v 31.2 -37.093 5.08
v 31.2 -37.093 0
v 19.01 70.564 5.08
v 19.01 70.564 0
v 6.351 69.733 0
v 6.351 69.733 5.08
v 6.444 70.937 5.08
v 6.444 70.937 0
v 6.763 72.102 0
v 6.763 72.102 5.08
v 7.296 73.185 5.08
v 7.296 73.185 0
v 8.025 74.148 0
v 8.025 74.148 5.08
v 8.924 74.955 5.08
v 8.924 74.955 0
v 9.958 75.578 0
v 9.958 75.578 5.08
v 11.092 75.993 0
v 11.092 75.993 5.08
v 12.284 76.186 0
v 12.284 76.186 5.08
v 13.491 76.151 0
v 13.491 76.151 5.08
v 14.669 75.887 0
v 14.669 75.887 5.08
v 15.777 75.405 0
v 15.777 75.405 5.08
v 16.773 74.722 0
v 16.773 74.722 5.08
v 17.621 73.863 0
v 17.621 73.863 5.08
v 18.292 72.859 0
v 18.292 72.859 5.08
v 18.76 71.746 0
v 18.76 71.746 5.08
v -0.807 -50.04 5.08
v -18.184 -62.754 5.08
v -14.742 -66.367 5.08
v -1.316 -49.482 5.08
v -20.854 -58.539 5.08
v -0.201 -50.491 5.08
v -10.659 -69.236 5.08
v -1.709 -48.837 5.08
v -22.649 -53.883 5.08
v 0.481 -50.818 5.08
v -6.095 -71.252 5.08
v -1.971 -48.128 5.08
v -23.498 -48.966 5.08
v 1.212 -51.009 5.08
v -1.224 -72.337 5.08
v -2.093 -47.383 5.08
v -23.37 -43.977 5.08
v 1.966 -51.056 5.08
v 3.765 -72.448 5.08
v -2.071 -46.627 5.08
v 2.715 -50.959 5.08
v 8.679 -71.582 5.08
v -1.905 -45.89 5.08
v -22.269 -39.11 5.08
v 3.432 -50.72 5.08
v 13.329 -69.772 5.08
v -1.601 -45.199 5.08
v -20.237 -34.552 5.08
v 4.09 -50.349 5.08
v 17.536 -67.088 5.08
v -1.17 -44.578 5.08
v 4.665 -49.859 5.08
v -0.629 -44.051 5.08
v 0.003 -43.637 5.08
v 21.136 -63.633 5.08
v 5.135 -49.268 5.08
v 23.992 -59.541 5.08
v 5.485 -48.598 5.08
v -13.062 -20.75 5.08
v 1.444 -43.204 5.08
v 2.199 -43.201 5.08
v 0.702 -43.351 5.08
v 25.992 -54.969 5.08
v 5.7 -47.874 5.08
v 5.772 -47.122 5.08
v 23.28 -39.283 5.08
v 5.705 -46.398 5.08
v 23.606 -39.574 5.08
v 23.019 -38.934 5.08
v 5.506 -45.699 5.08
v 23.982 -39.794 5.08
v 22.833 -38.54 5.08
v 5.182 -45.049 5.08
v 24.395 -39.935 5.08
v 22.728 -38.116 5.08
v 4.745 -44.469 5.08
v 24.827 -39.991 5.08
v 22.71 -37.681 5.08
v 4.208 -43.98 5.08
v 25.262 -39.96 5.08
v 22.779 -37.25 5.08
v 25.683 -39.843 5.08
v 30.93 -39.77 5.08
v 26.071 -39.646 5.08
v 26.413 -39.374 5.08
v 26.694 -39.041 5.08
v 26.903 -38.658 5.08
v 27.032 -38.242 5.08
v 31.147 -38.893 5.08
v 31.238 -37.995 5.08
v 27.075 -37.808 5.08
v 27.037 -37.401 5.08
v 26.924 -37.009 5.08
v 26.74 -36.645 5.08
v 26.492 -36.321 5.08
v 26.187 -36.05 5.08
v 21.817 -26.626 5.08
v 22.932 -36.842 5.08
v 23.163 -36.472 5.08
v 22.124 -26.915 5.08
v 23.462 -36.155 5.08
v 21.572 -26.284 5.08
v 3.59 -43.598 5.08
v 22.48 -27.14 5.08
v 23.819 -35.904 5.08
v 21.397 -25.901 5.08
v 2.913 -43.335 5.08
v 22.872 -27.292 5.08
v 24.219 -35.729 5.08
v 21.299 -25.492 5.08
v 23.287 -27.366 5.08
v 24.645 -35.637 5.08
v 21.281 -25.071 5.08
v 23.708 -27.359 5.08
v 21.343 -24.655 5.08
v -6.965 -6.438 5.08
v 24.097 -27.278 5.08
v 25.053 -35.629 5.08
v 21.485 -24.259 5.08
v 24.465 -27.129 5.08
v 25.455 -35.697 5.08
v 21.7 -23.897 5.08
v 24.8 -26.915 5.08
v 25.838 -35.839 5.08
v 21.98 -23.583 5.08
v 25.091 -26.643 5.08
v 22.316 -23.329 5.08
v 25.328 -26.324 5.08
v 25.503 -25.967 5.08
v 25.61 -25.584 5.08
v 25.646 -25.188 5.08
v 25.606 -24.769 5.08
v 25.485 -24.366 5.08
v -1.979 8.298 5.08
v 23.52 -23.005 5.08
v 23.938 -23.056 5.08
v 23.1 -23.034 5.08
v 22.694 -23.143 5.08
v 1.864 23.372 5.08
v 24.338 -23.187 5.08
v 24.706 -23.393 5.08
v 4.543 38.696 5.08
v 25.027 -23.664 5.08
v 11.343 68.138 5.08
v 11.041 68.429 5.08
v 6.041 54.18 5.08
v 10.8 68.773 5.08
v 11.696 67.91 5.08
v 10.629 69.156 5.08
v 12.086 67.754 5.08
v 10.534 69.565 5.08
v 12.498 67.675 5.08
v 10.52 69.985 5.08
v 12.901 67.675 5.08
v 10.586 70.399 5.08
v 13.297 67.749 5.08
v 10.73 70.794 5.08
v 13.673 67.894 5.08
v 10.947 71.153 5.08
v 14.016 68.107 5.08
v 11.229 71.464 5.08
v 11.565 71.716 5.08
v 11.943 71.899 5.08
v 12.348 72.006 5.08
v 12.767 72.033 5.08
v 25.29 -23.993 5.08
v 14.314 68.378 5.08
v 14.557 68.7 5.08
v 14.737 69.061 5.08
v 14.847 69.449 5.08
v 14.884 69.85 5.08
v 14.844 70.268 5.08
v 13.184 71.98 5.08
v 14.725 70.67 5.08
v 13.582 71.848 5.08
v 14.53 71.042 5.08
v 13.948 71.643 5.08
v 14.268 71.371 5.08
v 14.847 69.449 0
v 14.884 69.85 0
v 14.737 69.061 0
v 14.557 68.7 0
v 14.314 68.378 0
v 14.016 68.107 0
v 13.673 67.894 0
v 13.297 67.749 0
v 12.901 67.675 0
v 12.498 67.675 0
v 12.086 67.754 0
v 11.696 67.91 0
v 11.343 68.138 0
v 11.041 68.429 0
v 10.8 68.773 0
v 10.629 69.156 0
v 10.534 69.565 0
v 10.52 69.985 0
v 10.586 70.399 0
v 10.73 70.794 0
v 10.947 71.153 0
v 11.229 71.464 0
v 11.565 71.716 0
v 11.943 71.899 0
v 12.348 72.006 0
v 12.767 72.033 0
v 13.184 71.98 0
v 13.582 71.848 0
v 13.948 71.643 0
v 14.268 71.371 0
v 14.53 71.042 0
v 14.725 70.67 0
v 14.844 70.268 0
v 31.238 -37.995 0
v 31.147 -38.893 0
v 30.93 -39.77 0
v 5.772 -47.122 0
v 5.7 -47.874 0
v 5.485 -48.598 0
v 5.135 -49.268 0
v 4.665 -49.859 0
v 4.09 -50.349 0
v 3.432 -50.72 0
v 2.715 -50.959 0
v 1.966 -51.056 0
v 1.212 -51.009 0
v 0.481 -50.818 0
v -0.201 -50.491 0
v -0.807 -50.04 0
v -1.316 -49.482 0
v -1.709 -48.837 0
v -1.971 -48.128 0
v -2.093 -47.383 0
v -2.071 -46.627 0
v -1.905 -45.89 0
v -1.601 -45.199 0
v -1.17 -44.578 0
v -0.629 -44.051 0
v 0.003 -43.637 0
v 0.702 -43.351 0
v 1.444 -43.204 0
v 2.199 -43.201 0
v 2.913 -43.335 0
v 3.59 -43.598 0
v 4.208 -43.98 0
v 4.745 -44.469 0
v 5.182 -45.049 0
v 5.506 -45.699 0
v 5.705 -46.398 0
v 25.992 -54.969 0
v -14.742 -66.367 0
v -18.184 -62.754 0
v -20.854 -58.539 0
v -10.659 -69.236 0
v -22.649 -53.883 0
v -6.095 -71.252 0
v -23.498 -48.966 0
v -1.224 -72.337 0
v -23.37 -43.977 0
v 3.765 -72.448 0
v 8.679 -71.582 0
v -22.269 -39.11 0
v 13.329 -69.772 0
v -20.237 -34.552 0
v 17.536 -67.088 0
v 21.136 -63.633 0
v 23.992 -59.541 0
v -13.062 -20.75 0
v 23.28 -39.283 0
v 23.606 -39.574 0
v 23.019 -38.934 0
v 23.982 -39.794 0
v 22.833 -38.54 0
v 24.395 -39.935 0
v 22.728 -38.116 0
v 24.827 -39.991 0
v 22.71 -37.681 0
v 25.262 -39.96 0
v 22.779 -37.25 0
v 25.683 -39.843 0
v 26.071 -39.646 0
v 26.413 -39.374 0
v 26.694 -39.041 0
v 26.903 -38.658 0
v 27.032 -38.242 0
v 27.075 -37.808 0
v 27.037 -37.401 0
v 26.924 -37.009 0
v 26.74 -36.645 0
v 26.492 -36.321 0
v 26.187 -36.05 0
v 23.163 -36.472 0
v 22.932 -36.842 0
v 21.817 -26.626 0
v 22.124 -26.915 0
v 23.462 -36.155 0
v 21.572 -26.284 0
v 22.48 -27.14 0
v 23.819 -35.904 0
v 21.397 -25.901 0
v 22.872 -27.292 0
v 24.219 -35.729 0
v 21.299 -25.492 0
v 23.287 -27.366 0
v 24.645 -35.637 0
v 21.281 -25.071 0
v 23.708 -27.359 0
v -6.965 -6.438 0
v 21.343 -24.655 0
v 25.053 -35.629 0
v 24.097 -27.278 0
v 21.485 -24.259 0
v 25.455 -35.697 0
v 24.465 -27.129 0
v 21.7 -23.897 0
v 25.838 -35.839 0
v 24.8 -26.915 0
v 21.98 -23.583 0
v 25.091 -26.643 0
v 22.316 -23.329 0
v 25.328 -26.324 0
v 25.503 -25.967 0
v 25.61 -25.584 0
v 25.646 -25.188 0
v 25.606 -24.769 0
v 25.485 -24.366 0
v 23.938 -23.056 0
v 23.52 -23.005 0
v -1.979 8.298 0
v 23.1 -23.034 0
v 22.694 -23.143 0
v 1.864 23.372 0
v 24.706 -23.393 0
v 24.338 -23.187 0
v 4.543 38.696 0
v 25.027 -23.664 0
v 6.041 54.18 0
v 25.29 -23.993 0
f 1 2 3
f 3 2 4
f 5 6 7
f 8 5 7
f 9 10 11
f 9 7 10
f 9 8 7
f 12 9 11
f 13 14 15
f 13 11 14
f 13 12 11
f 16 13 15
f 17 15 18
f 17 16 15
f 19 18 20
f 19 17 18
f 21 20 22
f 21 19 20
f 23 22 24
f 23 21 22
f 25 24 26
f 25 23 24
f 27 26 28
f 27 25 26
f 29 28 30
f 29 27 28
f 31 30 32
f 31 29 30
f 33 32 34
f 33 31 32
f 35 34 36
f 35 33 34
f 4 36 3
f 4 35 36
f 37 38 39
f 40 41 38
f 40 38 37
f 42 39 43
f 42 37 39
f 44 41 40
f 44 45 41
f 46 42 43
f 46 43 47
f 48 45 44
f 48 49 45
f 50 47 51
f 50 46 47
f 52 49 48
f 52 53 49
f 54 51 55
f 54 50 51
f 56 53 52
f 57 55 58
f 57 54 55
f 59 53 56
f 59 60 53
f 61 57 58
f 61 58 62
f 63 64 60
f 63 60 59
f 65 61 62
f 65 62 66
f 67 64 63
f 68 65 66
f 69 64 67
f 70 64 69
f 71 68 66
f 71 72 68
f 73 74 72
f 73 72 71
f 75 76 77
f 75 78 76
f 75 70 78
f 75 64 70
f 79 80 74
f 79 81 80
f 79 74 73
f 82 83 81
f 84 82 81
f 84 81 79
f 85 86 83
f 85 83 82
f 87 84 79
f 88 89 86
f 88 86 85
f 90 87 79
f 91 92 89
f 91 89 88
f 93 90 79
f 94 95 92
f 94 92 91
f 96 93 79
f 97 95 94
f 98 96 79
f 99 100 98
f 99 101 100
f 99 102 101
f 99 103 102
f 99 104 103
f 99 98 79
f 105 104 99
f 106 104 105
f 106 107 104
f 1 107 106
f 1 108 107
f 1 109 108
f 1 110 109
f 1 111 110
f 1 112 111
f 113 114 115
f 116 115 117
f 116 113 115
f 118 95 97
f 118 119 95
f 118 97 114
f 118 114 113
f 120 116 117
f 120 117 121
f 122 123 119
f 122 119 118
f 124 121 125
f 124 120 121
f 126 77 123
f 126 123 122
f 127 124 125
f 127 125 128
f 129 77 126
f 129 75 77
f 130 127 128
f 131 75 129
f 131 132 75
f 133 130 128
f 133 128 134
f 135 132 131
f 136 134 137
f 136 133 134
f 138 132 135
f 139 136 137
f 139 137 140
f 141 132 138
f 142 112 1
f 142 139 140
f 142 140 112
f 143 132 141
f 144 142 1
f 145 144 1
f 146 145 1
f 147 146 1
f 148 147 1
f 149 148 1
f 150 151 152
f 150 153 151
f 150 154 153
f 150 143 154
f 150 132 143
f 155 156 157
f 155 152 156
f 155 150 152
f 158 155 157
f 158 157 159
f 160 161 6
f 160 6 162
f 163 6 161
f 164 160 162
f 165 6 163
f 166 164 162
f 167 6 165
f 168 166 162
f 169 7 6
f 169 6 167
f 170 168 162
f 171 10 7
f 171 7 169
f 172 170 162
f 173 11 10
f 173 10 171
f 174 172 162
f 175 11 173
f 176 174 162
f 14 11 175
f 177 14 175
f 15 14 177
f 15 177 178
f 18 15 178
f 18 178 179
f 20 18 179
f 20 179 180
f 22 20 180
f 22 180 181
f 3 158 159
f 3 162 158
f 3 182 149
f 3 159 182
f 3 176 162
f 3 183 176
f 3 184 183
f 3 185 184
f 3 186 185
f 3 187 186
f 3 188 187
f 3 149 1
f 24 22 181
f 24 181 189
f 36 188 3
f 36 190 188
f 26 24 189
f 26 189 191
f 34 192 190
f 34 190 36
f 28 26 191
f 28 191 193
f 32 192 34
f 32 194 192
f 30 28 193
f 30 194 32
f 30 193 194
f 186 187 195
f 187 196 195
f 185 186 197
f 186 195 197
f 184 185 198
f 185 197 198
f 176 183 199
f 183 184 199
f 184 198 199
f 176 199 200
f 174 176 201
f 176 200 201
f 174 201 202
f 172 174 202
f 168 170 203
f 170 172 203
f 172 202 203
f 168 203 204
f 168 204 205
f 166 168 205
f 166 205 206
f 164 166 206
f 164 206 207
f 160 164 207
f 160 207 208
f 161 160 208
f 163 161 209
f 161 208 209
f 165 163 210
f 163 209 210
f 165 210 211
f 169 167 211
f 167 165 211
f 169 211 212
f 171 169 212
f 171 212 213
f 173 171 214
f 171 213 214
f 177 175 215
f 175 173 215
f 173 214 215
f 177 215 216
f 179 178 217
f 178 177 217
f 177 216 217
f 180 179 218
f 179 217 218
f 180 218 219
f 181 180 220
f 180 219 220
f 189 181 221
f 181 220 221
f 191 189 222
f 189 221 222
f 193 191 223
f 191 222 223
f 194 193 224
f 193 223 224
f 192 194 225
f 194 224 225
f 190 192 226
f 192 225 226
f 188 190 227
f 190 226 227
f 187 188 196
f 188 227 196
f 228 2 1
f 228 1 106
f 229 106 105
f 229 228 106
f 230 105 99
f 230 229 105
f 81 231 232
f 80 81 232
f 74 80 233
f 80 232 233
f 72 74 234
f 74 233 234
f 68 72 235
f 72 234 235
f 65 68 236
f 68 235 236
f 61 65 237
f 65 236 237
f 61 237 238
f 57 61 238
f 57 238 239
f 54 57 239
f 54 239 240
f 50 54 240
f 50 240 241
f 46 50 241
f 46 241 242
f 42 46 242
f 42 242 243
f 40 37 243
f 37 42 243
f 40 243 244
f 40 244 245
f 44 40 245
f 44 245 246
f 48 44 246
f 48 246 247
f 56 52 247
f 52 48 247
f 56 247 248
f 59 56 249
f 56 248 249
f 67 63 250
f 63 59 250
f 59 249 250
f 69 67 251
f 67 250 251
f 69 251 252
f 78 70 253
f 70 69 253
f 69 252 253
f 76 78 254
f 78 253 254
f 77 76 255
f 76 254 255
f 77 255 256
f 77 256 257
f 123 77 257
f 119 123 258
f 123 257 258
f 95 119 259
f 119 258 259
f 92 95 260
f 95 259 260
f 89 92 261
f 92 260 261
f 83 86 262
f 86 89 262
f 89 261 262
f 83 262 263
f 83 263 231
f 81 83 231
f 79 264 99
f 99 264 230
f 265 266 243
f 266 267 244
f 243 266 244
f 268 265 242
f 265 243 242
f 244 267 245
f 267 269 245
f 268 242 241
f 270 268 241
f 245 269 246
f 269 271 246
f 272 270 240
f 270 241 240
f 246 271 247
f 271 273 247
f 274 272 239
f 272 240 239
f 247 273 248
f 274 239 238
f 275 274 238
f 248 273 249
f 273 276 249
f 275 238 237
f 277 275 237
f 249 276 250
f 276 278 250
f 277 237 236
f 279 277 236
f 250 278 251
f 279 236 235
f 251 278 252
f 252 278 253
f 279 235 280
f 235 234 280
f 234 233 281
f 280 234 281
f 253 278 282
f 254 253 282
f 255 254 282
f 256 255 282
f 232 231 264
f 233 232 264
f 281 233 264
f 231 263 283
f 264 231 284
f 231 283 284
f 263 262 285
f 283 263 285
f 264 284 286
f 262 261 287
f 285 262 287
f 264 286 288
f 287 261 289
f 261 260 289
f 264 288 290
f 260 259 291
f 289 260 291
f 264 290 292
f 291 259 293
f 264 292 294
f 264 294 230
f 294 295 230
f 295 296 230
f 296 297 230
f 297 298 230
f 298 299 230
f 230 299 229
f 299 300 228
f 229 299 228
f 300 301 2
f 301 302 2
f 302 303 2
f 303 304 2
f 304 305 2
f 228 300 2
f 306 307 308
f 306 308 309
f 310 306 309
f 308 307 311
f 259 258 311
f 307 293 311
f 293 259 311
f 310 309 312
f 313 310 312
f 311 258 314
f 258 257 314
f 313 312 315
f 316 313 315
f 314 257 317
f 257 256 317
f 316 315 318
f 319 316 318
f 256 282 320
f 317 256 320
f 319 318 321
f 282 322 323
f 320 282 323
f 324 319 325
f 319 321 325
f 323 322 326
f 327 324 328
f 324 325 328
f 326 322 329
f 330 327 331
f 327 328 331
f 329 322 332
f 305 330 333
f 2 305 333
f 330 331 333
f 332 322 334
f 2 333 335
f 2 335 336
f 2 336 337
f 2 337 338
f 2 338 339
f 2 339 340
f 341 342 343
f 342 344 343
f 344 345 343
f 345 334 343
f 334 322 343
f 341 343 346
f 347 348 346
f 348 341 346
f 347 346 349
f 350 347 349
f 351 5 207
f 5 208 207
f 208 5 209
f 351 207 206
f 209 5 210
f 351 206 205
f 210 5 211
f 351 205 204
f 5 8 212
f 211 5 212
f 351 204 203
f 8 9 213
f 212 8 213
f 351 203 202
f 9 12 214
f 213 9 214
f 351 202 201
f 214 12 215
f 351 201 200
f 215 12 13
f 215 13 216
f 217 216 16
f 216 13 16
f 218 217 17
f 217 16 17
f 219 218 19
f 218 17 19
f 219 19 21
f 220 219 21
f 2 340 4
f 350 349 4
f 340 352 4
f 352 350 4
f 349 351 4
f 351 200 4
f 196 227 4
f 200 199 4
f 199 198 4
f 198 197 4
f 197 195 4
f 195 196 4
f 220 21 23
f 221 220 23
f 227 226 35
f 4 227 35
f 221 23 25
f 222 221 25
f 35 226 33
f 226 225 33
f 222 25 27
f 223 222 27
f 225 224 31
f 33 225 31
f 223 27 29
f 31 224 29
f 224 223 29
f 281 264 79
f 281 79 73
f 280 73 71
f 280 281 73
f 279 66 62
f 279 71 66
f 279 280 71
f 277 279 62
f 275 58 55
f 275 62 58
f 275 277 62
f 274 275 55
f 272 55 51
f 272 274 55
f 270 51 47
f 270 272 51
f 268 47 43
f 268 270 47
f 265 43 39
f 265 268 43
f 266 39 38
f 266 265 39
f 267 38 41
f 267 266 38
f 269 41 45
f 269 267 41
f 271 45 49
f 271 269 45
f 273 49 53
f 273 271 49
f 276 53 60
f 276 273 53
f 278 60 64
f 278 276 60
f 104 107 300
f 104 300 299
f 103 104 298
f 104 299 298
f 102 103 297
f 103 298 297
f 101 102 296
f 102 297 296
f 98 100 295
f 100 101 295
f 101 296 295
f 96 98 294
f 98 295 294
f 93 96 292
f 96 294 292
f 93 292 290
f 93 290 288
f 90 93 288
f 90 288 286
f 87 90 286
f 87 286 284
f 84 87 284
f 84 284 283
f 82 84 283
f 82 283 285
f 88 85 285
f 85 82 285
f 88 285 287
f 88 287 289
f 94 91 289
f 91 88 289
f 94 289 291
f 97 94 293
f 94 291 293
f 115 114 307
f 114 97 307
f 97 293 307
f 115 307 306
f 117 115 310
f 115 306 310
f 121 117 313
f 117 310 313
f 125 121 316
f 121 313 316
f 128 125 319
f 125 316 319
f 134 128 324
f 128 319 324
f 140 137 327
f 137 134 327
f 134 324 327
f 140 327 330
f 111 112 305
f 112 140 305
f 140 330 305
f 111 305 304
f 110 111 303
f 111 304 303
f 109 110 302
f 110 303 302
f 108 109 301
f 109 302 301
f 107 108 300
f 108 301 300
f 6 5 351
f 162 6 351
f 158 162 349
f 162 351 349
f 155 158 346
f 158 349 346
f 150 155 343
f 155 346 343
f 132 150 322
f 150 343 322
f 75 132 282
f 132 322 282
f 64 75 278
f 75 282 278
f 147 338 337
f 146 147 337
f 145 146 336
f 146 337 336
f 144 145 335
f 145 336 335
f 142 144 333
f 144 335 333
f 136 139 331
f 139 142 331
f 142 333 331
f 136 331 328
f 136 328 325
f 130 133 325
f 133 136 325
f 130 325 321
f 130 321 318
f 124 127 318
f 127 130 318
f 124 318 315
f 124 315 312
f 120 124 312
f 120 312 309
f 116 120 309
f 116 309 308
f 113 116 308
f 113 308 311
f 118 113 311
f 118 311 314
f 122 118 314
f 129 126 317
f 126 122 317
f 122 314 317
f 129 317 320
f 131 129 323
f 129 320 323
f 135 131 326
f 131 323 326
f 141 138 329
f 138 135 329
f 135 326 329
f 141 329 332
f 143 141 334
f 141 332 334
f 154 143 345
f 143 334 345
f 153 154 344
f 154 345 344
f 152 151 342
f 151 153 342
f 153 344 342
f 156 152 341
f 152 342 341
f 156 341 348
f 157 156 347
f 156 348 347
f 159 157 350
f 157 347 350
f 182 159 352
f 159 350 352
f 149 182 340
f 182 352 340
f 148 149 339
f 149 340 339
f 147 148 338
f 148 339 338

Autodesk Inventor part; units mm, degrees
ref_plane "YZ Plane" through (0, 0, 0) normal (1, 0, 0) x (0, 1, 0)
ref_plane "XZ Plane" through (0, 0, 0) normal (0, 1, 0) x (-1, 0, 0)
ref_plane "XY Plane" through (0, 0, 0) normal (0, 0, 1) x (1, 0, 0)
sketch "Sketch1" plane through (0, 0, 0) normal (0, 0, 1) x (1, 0, 0)
  circle A0 centre (1.835, -47.1215) radius 2.1844
  circle A1 centre (12.7, 69.85) radius 2.1844 projected
  arc A2 (19.0097, 70.5645) -> (6.3511, 69.7333) centre (12.7, 69.85) ccw
  arc A3 (-20.2372, -34.5525) -> (25.9922, -54.9693) centre (1.835, -47.1215) ccw
  line L0 (25.9922, -54.9693) -> (30.9301, -39.7696)
  line L1 (31.2005, -37.0931) -> (19.0097, 70.5645)
  arc A4 (-20.2372, -34.5525) -> (6.3511, 69.7333) centre (-196.8146, 65.9992) ccw
  arc A5 (30.9301, -39.7696) -> (31.2005, -37.0931) centre (24.8908, -37.8076) ccw
  line L2 (5.0608, -43.8957) -> (-1.3908, -43.8957)
  line L3 (-1.3908, -43.8957) -> (-1.3908, -50.3473)
  line L4 (-1.3908, -50.3473) -> (5.0608, -50.3473)
  line L5 (5.0608, -50.3473) -> (5.0608, -43.8957)
  line L6 (5.0608, -43.8957) -> (-1.3908, -50.3473) construction
  line L7 (-1.3908, -43.8957) -> (5.0608, -50.3473) construction
  circle A6 centre (1.835, -47.1215) radius 3.937
  circle A7 centre (24.8908, -37.8076) radius 2.1844
  circle A8 centre (23.4618, -25.1883) radius 2.1844
  line L8 (24.8908, -37.8076) -> (23.4618, -25.1883)
  line L9 (1.835, -47.1215) -> (12.7, 69.85)
  point P0 (0, 0)
  dimension "d0" = 12.7
  dimension "d2" = 50.8
  dimension "d3" = 203.2
  dimension "d4" = 6.35
  dimension "d7" = 6.4516
  dimension "d8" = 6.4516
  dimension "d10" = 7.874
  dimension "d11" = 4.3688
  dimension "d12" = 4.3688
  dimension "d14" = 12.7
  dimension "d15" = 117.475
extrude "Extrusion1" add sketch "Sketch1" along normal blind 5.08 contours L2 L5 A6 | A6 L3 L2 | L5 L4 A6 | A6 L4 L3 | L1 A5 L0 A3 A4 A2
properties part number "intakeSide"
